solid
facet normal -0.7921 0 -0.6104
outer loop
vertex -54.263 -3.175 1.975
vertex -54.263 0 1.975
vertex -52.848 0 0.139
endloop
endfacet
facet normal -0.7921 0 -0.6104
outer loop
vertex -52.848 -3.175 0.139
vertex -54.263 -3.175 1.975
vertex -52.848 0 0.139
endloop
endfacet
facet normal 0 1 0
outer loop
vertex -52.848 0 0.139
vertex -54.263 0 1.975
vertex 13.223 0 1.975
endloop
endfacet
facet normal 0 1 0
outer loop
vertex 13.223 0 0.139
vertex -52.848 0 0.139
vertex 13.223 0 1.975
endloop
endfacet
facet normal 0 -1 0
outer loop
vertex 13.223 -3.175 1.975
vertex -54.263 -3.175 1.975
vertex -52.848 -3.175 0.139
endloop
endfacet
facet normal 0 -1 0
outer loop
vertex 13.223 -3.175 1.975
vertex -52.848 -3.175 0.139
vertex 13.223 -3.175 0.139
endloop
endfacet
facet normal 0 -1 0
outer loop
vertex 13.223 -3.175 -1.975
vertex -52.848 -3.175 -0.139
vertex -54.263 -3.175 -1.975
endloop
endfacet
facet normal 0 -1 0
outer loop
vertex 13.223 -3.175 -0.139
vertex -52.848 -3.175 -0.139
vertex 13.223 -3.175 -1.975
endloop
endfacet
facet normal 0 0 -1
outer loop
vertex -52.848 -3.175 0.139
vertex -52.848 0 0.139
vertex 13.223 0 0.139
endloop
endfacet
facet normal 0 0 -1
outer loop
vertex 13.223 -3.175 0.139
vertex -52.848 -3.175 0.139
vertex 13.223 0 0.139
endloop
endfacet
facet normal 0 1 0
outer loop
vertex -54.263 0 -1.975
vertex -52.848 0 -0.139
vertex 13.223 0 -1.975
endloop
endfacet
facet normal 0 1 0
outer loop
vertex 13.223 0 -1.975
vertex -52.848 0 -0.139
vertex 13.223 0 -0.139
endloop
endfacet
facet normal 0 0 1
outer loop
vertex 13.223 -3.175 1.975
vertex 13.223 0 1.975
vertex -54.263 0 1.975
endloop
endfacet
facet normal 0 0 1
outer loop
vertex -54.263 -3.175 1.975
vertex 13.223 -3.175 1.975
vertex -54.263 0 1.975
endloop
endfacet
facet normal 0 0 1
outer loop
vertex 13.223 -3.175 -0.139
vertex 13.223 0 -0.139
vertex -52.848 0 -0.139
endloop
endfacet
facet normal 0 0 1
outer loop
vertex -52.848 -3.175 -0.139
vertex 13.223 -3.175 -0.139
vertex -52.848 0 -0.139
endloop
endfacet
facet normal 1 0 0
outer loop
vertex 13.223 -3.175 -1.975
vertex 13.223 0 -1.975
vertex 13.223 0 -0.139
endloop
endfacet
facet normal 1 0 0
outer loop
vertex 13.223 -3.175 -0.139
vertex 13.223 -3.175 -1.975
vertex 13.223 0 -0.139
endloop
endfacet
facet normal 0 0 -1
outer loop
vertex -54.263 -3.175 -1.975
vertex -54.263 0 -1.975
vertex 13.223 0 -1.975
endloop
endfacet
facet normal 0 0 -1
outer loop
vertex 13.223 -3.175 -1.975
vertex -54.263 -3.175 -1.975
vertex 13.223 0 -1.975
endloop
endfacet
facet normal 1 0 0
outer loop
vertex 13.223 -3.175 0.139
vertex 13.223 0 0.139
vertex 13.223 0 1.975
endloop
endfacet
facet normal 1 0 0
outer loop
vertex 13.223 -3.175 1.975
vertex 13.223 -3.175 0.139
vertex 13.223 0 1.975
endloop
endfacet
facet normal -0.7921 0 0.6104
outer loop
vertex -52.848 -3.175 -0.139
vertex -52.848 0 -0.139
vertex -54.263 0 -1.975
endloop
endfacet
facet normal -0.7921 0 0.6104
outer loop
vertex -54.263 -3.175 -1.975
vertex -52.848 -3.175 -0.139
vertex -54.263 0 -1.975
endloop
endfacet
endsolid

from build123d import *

# Parameters (mm, degrees)
F1_DEPTH = 3.175


# Not quite as in the source:
# - a feature names something its author has since deleted; it is built from what else it names


with BuildPart() as f1:
    # F0 (on Front) → F1 (new body)
    with BuildSketch(Plane.XZ):
        Polygon((-6.1159002899, -0.1391640983), (-13.6670420062, -0.1391640983), (-41.0246514305, -0.1391640983), (-52.8478002203, -0.1391640983), (-54.263135106, -1.9746770844), (13.2233296217, -1.9746770844), (13.2233296217, -0.1391640983), align=None)
    extrude(amount=F1_DEPTH)


with BuildPart() as f1b:
    # F0 (on Front) → F1, piece 2 (new body)
    with BuildSketch(Plane.XZ):
        Polygon((13.2233296217, 1.9746770844), (-54.263135106, 1.9746770844), (-52.8478002203, 0.1391640983), (-41.0246514305, 0.1391640983), (-13.6670420062, 0.1391640983), (-6.1159002899, 0.1391640983), (13.2233296217, 0.1391640983), align=None)
    extrude(amount=F1_DEPTH)


solid = Compound([f1.part, f1b.part])
